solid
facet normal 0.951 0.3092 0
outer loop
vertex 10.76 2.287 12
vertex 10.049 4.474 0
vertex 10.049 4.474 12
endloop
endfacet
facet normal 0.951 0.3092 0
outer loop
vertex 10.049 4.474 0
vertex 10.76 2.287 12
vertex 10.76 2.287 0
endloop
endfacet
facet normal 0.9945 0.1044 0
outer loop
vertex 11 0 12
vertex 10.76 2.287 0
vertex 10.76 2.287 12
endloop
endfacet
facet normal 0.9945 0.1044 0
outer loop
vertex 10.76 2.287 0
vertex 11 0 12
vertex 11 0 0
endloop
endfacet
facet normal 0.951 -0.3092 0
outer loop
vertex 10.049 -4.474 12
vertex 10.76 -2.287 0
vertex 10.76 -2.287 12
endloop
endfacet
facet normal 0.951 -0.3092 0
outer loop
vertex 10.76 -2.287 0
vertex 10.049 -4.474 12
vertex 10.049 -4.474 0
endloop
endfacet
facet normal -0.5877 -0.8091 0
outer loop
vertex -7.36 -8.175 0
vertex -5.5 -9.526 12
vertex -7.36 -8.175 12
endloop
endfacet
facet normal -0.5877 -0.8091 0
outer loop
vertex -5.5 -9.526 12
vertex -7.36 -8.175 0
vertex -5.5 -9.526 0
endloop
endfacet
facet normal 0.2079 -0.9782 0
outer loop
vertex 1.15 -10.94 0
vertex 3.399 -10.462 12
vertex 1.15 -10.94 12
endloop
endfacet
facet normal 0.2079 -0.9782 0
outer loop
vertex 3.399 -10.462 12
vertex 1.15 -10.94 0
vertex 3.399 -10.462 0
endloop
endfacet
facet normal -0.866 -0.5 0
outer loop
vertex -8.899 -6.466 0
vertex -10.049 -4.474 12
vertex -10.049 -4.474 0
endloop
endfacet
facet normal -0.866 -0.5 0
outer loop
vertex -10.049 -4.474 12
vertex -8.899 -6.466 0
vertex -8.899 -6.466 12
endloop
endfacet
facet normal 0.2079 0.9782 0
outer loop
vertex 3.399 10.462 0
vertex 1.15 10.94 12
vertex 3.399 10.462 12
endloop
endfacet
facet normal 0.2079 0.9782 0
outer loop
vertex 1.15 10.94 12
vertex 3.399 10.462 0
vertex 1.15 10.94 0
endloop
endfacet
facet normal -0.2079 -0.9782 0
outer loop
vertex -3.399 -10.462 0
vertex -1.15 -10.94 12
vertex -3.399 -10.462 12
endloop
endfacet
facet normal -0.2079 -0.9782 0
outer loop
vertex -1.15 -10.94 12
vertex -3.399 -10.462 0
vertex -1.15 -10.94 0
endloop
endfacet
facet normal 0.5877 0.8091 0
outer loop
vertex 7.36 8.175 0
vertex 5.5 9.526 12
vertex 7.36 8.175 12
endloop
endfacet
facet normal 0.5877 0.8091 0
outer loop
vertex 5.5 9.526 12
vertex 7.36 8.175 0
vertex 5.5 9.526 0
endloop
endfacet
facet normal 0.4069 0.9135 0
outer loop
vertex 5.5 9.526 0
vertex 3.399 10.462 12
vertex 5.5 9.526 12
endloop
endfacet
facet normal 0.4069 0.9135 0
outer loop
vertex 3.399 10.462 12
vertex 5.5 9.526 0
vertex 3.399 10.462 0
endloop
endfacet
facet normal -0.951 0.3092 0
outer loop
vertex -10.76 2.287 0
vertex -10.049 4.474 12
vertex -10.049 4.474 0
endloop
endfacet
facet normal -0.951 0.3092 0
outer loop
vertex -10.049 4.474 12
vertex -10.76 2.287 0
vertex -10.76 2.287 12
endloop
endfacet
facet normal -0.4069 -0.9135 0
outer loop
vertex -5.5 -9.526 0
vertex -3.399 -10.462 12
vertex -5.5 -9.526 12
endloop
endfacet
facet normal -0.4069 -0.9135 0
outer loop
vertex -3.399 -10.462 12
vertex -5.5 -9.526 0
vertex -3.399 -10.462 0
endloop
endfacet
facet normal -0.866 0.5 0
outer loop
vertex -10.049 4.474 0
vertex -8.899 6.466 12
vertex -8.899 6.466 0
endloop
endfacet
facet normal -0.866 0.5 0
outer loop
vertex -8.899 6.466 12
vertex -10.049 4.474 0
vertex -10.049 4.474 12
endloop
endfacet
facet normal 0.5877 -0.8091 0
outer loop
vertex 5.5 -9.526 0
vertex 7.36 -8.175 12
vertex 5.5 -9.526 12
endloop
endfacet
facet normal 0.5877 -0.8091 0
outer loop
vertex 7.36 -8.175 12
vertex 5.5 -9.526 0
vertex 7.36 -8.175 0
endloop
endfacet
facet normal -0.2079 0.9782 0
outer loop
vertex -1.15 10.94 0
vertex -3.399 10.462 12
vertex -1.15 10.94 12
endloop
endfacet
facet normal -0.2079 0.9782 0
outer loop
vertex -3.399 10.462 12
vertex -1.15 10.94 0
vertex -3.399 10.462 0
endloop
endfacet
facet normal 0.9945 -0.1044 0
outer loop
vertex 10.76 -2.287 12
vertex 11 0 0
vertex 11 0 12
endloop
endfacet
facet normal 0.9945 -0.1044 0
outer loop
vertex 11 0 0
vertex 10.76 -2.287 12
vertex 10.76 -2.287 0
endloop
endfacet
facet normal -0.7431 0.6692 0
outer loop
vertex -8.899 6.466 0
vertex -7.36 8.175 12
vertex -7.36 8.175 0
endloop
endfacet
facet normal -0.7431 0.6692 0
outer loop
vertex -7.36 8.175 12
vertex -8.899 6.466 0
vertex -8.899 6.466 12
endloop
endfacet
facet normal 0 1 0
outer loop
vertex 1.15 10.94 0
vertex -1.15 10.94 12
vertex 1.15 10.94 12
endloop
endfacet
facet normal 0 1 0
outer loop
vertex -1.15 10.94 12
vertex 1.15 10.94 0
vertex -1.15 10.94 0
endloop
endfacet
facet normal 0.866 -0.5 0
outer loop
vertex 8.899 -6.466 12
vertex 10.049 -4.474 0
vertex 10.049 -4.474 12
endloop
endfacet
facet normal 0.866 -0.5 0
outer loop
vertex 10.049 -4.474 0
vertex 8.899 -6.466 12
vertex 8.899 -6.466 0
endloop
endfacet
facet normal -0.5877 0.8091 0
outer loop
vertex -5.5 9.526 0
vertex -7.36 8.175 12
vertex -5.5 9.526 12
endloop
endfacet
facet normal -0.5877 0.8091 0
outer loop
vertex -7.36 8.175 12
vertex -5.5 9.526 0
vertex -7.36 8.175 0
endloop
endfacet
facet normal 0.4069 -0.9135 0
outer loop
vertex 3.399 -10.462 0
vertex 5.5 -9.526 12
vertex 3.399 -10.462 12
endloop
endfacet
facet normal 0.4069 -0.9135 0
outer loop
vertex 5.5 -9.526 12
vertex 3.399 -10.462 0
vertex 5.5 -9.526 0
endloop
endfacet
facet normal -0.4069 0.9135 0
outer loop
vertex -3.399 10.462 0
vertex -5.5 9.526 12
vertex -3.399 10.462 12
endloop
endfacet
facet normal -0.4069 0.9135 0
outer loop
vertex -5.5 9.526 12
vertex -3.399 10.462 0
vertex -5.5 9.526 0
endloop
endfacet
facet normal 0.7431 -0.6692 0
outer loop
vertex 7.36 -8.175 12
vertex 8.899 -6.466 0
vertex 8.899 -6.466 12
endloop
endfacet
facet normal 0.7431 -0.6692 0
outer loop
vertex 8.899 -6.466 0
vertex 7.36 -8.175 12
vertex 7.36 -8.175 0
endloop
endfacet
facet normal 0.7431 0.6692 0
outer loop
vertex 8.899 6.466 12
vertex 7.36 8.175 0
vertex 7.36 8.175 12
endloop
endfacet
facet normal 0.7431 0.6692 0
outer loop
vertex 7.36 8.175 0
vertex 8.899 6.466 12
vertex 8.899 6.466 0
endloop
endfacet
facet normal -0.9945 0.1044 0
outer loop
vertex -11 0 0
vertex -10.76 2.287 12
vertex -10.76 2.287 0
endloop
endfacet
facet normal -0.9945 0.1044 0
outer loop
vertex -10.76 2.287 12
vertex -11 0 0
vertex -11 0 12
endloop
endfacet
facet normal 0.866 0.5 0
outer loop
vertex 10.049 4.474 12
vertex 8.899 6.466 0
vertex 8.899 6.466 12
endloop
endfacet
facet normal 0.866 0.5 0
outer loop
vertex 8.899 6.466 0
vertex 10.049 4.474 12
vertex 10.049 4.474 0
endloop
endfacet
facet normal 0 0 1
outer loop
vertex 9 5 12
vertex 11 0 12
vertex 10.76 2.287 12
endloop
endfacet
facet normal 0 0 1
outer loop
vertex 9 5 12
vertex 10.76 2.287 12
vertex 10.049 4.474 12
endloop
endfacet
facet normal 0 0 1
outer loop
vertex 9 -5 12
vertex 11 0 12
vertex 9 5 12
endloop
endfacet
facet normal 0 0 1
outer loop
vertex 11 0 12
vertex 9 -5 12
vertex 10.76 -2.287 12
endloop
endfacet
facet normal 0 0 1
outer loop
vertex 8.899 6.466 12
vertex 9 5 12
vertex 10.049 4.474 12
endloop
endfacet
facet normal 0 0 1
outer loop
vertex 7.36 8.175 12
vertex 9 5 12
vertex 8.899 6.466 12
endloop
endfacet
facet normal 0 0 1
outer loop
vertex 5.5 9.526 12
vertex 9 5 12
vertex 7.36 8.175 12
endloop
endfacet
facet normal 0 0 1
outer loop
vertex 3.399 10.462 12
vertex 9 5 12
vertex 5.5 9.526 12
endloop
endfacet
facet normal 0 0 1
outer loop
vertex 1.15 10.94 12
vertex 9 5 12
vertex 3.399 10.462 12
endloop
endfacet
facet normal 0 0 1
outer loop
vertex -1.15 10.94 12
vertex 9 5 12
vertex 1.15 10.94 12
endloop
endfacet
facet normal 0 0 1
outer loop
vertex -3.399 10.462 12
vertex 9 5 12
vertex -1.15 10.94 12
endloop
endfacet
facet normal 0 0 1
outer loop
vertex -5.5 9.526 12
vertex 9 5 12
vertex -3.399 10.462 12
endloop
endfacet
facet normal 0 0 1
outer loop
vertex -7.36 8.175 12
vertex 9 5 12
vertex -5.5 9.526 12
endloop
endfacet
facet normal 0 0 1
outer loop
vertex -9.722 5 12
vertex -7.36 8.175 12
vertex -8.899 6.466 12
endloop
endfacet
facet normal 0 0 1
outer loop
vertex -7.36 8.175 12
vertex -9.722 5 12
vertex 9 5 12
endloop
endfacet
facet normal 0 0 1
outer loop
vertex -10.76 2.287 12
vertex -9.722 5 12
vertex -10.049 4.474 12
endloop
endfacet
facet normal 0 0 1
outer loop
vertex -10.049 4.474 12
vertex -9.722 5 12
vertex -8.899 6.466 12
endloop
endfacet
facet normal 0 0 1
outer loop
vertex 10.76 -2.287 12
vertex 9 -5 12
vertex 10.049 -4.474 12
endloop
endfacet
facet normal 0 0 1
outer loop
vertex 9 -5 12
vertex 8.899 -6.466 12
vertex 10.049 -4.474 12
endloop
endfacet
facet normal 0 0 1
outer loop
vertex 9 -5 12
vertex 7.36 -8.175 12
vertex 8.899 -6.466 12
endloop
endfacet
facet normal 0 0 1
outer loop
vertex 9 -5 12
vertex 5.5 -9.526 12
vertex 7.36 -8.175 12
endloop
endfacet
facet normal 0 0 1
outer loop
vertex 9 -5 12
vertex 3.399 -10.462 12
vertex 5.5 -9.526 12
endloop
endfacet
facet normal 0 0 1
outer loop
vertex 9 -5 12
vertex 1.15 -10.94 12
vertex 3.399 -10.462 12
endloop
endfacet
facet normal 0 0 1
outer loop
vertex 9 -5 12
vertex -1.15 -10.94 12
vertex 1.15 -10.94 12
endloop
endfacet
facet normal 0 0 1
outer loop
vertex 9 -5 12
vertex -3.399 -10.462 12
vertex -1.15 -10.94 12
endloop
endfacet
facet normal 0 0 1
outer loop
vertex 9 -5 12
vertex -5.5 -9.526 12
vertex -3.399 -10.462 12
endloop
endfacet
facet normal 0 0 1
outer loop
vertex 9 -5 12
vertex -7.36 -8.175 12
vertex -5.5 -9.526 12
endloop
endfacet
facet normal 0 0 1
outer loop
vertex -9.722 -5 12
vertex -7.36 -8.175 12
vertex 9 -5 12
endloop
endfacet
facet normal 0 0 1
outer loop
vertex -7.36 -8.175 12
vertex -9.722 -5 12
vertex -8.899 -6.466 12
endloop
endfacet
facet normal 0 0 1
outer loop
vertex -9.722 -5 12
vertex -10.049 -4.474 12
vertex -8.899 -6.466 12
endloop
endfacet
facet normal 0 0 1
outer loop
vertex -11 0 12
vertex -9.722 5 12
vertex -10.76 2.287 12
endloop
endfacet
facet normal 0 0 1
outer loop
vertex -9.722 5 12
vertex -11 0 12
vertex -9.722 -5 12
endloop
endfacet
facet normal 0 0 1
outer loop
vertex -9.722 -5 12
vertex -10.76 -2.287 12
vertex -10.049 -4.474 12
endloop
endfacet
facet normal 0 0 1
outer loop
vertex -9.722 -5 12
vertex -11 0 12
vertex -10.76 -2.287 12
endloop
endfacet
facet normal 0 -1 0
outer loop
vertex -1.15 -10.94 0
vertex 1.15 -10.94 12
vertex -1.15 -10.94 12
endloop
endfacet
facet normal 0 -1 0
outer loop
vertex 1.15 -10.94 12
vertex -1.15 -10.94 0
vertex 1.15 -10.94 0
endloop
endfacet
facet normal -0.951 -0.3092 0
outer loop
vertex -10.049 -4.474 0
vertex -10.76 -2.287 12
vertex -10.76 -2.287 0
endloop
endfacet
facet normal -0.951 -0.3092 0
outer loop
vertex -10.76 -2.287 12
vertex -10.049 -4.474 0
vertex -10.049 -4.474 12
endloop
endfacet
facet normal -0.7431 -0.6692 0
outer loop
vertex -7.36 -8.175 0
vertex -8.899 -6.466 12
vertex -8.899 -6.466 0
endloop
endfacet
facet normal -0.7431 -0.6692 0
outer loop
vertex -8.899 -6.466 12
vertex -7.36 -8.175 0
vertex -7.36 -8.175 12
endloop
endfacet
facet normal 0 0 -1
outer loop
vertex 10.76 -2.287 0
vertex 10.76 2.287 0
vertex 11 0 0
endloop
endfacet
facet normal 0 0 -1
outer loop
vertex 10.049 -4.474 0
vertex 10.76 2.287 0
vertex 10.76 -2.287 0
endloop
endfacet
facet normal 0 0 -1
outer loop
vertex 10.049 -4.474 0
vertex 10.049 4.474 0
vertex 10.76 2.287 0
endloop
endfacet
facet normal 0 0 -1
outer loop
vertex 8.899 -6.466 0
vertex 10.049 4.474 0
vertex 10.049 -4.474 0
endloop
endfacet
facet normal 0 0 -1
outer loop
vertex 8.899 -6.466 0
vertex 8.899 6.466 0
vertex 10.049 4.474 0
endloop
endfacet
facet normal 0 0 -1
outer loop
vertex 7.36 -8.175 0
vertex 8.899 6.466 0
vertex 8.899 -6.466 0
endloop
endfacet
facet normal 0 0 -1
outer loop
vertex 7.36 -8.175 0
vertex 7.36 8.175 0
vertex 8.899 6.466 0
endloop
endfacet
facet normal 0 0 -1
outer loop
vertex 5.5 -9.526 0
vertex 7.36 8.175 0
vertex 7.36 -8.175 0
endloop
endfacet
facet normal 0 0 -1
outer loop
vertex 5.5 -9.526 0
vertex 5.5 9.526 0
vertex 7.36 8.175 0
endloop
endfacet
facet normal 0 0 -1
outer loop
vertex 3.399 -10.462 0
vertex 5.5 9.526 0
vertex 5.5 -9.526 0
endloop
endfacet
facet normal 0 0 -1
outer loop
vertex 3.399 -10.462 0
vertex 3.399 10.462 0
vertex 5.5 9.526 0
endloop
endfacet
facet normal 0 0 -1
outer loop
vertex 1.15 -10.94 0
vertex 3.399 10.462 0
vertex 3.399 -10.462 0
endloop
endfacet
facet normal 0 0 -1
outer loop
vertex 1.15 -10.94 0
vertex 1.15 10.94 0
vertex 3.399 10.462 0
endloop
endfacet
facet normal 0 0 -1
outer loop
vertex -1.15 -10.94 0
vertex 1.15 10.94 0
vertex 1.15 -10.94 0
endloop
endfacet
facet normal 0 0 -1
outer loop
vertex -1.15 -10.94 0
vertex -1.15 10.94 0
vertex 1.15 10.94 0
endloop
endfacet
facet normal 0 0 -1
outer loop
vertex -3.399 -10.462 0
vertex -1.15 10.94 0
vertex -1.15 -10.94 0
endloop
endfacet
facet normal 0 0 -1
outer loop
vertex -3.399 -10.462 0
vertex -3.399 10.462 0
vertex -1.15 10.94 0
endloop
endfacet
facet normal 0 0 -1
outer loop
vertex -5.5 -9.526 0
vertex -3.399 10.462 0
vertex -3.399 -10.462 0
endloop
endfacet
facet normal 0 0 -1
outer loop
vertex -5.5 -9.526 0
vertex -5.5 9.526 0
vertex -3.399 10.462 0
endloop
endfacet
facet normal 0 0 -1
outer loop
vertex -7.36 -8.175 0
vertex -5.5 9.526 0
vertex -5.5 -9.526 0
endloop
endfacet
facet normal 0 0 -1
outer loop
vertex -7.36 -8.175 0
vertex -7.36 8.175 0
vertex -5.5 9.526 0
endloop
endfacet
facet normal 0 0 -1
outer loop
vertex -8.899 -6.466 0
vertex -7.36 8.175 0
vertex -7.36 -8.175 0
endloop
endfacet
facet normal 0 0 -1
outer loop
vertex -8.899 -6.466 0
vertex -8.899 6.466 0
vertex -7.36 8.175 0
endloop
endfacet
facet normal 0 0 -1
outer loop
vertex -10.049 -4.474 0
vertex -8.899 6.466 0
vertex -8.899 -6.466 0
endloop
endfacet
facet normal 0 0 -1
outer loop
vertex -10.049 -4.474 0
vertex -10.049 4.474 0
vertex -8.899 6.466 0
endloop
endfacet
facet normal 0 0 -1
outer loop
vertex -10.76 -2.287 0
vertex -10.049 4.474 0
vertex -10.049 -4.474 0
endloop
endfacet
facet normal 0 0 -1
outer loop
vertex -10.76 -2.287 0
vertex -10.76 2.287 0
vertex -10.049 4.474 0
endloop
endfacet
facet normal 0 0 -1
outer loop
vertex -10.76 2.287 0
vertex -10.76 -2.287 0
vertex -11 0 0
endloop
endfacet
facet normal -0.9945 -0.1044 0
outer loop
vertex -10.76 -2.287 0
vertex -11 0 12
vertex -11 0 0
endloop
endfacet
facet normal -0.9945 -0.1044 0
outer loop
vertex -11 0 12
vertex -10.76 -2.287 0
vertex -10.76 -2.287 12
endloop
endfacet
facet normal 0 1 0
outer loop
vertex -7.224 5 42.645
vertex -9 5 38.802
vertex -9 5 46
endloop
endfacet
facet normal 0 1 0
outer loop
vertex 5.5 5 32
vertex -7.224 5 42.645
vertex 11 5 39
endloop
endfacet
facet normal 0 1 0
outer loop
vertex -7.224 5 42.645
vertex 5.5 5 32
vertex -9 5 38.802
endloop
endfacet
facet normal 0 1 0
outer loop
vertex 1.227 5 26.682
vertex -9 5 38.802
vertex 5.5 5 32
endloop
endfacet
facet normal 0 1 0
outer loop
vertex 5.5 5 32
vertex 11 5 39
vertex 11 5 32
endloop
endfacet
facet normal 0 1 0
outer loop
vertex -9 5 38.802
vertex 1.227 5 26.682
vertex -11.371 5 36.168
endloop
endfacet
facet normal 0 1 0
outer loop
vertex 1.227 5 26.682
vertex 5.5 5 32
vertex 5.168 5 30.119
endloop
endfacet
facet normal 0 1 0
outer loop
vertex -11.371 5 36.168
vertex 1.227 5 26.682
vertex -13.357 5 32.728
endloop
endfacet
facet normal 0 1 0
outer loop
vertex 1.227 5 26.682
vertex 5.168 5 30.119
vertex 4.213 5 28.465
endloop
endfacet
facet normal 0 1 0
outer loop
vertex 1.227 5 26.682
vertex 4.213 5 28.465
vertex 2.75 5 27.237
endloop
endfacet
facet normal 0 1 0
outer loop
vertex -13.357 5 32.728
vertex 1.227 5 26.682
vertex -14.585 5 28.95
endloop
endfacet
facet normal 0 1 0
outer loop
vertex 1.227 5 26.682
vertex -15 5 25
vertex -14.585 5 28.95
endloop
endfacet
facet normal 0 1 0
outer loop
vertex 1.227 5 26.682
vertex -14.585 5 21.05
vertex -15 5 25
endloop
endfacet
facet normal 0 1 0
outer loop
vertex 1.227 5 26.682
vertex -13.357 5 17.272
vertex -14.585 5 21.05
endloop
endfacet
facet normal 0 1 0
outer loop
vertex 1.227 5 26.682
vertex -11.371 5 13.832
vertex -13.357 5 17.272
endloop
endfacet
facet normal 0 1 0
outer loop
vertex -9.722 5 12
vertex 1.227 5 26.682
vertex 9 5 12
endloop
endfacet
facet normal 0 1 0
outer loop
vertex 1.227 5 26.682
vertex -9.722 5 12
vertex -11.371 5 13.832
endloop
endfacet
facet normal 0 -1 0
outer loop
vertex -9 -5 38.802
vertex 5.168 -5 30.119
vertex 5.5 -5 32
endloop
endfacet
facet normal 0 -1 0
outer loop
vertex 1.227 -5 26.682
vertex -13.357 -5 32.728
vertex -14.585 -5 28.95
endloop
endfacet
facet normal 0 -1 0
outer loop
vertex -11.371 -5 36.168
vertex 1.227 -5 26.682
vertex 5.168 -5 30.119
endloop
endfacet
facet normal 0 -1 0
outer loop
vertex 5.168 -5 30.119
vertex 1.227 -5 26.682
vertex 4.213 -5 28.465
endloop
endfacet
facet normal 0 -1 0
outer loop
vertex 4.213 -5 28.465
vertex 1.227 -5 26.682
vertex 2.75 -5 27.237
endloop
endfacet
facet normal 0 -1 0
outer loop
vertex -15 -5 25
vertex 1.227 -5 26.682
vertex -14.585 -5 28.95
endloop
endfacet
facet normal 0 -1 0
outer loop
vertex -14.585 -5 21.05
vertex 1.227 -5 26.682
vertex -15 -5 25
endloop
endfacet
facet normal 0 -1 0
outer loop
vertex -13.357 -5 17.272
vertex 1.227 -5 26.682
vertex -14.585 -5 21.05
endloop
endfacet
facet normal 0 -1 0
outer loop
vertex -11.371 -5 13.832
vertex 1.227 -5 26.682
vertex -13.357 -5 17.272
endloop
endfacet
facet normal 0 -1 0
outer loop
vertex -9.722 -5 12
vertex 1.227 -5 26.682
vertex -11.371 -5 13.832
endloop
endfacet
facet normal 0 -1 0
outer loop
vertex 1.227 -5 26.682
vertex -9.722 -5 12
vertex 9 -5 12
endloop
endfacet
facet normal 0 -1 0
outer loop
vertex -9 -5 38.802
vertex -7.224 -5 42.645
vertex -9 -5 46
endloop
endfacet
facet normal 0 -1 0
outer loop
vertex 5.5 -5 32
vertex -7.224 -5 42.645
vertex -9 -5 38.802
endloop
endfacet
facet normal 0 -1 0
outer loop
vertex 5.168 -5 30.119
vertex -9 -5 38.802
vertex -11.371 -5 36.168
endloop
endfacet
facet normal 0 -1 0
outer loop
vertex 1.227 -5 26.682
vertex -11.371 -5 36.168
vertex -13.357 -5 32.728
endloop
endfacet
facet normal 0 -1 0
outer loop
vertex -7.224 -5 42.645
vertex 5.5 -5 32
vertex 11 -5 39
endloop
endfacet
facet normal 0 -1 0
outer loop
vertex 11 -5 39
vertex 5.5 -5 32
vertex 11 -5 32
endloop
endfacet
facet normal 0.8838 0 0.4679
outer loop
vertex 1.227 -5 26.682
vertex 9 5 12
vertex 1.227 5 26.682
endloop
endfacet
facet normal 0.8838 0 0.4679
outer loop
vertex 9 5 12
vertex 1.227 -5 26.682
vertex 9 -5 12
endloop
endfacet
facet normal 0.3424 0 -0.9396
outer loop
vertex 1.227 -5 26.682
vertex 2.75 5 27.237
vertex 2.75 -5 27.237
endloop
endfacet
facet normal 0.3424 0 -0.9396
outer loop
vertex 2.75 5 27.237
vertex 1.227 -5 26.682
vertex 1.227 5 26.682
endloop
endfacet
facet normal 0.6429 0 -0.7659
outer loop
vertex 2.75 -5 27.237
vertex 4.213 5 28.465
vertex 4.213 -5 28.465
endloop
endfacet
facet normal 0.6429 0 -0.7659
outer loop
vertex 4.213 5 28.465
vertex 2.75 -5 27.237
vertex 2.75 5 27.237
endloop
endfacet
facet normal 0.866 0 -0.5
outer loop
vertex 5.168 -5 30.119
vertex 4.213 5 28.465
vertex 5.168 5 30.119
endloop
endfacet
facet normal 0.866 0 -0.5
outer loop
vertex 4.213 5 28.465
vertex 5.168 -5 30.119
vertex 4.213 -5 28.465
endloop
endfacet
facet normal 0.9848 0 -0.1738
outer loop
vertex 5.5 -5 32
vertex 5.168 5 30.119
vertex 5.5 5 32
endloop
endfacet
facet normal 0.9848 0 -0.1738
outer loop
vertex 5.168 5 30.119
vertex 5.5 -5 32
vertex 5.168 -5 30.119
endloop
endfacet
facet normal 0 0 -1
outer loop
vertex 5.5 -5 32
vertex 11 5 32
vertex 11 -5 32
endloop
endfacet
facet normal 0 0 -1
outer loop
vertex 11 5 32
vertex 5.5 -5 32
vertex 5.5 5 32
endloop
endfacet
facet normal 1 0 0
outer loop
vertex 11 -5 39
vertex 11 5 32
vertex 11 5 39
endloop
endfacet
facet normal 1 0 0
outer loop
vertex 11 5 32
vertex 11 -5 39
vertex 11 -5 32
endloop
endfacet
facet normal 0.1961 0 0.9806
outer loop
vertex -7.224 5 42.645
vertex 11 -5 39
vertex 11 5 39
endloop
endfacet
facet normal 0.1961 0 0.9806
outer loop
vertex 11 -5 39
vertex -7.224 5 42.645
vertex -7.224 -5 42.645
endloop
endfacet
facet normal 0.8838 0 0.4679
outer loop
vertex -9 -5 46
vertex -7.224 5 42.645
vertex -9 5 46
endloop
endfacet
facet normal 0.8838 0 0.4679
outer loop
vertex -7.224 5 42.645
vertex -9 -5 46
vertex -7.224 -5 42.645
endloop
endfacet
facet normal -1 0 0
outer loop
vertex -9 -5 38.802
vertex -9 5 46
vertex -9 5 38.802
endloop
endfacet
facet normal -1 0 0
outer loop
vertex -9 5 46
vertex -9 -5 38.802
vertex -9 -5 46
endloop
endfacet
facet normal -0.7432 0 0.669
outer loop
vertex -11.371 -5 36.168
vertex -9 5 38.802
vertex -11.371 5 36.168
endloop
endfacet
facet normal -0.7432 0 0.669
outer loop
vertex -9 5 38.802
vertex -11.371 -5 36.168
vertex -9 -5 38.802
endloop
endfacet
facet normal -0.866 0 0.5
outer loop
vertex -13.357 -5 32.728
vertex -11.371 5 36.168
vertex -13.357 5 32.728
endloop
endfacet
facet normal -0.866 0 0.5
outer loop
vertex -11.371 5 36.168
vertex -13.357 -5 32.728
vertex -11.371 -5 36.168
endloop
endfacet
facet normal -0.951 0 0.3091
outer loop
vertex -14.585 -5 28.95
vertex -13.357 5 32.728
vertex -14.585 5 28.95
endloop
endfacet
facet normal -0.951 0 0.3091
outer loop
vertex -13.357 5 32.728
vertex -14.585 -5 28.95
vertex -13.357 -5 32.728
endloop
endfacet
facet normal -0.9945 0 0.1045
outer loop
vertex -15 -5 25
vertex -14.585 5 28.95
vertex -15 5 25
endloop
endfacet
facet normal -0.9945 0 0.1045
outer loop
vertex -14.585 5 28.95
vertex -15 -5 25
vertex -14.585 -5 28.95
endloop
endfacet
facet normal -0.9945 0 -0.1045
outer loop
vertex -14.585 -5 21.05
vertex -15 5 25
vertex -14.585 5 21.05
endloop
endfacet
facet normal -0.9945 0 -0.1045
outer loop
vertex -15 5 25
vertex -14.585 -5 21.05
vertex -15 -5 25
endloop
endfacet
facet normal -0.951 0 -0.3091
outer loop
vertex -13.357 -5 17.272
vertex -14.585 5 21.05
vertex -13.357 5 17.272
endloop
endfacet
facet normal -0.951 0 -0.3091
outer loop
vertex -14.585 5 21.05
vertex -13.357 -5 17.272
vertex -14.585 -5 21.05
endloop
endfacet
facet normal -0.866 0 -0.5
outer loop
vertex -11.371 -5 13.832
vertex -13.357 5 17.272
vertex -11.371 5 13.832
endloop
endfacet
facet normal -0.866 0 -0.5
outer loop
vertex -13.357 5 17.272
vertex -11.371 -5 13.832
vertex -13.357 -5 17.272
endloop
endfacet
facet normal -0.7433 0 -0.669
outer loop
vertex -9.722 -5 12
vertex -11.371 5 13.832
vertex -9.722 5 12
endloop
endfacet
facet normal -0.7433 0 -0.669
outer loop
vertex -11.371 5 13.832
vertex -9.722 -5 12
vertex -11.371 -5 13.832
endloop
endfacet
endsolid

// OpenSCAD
// Generated by SolidPython 1.1.1 on 2021-11-03 12:04:39


union() {
	cylinder(d = 22, h = 12);
	translate(v = [0, 0, 12]) {
		translate(v = [-9, 5, 0]) {
			rotate(a = [90, 0, 0]) {
				linear_extrude(height = 10) {
					union() {
						polygon(points = [[0, 0], [0, 34], [18, 0]]);
						translate(v = [9, 20, 0]) {
							circle(d = 11);
						}
						translate(v = [0, 20, 0]) {
							polygon(points = [[0, 0], [0, 11], [20, 7], [20, 0]]);
						}
						translate(v = [13, 13, 0]) {
							difference() {
								circle(d = 38);
								translate(v = [-13, -19, 0]) {
									square(size = 39);
								}
							}
						}
					}
				}
			}
		}
	}
}
/***********************************************
*********      SolidPython code:      **********
************************************************
 
from solid import *
from solid.utils import *

#total height 5.6cm
def old():
    base = cylinder(d=22, h=12)
    body = cylinder(d1=20, d2=6, h=30)
    head = rotate([0,120,0])(down(5)(cylinder(d1=6, d2=16, h=5)) + cylinder(d1=16, d2=6, h=16) + up(16)(sphere(d=6)))

    knight = base + up(12)(body) + up(38)(head)
    return knight

base = cylinder(d=22, h=12)
body = polygon([[0,0],[0,34],[18,0]])
body += translate([9,20,0])(circle(d=11))
body += translate([0,20,0])(polygon([[0,0],[0,11],[20,7],[20,0]]))
mane = circle(d=38) - translate([-13,-19,0])((square(39)))
body += translate([13,13,0])(mane)
body = rotate([90,0,0])(linear_extrude(height=10)(body))
body = translate([-9,5,0])(body)

knight = base + up(12)(body)

scad_render_to_file(knight, "./knight.scad") 
 
************************************************/
